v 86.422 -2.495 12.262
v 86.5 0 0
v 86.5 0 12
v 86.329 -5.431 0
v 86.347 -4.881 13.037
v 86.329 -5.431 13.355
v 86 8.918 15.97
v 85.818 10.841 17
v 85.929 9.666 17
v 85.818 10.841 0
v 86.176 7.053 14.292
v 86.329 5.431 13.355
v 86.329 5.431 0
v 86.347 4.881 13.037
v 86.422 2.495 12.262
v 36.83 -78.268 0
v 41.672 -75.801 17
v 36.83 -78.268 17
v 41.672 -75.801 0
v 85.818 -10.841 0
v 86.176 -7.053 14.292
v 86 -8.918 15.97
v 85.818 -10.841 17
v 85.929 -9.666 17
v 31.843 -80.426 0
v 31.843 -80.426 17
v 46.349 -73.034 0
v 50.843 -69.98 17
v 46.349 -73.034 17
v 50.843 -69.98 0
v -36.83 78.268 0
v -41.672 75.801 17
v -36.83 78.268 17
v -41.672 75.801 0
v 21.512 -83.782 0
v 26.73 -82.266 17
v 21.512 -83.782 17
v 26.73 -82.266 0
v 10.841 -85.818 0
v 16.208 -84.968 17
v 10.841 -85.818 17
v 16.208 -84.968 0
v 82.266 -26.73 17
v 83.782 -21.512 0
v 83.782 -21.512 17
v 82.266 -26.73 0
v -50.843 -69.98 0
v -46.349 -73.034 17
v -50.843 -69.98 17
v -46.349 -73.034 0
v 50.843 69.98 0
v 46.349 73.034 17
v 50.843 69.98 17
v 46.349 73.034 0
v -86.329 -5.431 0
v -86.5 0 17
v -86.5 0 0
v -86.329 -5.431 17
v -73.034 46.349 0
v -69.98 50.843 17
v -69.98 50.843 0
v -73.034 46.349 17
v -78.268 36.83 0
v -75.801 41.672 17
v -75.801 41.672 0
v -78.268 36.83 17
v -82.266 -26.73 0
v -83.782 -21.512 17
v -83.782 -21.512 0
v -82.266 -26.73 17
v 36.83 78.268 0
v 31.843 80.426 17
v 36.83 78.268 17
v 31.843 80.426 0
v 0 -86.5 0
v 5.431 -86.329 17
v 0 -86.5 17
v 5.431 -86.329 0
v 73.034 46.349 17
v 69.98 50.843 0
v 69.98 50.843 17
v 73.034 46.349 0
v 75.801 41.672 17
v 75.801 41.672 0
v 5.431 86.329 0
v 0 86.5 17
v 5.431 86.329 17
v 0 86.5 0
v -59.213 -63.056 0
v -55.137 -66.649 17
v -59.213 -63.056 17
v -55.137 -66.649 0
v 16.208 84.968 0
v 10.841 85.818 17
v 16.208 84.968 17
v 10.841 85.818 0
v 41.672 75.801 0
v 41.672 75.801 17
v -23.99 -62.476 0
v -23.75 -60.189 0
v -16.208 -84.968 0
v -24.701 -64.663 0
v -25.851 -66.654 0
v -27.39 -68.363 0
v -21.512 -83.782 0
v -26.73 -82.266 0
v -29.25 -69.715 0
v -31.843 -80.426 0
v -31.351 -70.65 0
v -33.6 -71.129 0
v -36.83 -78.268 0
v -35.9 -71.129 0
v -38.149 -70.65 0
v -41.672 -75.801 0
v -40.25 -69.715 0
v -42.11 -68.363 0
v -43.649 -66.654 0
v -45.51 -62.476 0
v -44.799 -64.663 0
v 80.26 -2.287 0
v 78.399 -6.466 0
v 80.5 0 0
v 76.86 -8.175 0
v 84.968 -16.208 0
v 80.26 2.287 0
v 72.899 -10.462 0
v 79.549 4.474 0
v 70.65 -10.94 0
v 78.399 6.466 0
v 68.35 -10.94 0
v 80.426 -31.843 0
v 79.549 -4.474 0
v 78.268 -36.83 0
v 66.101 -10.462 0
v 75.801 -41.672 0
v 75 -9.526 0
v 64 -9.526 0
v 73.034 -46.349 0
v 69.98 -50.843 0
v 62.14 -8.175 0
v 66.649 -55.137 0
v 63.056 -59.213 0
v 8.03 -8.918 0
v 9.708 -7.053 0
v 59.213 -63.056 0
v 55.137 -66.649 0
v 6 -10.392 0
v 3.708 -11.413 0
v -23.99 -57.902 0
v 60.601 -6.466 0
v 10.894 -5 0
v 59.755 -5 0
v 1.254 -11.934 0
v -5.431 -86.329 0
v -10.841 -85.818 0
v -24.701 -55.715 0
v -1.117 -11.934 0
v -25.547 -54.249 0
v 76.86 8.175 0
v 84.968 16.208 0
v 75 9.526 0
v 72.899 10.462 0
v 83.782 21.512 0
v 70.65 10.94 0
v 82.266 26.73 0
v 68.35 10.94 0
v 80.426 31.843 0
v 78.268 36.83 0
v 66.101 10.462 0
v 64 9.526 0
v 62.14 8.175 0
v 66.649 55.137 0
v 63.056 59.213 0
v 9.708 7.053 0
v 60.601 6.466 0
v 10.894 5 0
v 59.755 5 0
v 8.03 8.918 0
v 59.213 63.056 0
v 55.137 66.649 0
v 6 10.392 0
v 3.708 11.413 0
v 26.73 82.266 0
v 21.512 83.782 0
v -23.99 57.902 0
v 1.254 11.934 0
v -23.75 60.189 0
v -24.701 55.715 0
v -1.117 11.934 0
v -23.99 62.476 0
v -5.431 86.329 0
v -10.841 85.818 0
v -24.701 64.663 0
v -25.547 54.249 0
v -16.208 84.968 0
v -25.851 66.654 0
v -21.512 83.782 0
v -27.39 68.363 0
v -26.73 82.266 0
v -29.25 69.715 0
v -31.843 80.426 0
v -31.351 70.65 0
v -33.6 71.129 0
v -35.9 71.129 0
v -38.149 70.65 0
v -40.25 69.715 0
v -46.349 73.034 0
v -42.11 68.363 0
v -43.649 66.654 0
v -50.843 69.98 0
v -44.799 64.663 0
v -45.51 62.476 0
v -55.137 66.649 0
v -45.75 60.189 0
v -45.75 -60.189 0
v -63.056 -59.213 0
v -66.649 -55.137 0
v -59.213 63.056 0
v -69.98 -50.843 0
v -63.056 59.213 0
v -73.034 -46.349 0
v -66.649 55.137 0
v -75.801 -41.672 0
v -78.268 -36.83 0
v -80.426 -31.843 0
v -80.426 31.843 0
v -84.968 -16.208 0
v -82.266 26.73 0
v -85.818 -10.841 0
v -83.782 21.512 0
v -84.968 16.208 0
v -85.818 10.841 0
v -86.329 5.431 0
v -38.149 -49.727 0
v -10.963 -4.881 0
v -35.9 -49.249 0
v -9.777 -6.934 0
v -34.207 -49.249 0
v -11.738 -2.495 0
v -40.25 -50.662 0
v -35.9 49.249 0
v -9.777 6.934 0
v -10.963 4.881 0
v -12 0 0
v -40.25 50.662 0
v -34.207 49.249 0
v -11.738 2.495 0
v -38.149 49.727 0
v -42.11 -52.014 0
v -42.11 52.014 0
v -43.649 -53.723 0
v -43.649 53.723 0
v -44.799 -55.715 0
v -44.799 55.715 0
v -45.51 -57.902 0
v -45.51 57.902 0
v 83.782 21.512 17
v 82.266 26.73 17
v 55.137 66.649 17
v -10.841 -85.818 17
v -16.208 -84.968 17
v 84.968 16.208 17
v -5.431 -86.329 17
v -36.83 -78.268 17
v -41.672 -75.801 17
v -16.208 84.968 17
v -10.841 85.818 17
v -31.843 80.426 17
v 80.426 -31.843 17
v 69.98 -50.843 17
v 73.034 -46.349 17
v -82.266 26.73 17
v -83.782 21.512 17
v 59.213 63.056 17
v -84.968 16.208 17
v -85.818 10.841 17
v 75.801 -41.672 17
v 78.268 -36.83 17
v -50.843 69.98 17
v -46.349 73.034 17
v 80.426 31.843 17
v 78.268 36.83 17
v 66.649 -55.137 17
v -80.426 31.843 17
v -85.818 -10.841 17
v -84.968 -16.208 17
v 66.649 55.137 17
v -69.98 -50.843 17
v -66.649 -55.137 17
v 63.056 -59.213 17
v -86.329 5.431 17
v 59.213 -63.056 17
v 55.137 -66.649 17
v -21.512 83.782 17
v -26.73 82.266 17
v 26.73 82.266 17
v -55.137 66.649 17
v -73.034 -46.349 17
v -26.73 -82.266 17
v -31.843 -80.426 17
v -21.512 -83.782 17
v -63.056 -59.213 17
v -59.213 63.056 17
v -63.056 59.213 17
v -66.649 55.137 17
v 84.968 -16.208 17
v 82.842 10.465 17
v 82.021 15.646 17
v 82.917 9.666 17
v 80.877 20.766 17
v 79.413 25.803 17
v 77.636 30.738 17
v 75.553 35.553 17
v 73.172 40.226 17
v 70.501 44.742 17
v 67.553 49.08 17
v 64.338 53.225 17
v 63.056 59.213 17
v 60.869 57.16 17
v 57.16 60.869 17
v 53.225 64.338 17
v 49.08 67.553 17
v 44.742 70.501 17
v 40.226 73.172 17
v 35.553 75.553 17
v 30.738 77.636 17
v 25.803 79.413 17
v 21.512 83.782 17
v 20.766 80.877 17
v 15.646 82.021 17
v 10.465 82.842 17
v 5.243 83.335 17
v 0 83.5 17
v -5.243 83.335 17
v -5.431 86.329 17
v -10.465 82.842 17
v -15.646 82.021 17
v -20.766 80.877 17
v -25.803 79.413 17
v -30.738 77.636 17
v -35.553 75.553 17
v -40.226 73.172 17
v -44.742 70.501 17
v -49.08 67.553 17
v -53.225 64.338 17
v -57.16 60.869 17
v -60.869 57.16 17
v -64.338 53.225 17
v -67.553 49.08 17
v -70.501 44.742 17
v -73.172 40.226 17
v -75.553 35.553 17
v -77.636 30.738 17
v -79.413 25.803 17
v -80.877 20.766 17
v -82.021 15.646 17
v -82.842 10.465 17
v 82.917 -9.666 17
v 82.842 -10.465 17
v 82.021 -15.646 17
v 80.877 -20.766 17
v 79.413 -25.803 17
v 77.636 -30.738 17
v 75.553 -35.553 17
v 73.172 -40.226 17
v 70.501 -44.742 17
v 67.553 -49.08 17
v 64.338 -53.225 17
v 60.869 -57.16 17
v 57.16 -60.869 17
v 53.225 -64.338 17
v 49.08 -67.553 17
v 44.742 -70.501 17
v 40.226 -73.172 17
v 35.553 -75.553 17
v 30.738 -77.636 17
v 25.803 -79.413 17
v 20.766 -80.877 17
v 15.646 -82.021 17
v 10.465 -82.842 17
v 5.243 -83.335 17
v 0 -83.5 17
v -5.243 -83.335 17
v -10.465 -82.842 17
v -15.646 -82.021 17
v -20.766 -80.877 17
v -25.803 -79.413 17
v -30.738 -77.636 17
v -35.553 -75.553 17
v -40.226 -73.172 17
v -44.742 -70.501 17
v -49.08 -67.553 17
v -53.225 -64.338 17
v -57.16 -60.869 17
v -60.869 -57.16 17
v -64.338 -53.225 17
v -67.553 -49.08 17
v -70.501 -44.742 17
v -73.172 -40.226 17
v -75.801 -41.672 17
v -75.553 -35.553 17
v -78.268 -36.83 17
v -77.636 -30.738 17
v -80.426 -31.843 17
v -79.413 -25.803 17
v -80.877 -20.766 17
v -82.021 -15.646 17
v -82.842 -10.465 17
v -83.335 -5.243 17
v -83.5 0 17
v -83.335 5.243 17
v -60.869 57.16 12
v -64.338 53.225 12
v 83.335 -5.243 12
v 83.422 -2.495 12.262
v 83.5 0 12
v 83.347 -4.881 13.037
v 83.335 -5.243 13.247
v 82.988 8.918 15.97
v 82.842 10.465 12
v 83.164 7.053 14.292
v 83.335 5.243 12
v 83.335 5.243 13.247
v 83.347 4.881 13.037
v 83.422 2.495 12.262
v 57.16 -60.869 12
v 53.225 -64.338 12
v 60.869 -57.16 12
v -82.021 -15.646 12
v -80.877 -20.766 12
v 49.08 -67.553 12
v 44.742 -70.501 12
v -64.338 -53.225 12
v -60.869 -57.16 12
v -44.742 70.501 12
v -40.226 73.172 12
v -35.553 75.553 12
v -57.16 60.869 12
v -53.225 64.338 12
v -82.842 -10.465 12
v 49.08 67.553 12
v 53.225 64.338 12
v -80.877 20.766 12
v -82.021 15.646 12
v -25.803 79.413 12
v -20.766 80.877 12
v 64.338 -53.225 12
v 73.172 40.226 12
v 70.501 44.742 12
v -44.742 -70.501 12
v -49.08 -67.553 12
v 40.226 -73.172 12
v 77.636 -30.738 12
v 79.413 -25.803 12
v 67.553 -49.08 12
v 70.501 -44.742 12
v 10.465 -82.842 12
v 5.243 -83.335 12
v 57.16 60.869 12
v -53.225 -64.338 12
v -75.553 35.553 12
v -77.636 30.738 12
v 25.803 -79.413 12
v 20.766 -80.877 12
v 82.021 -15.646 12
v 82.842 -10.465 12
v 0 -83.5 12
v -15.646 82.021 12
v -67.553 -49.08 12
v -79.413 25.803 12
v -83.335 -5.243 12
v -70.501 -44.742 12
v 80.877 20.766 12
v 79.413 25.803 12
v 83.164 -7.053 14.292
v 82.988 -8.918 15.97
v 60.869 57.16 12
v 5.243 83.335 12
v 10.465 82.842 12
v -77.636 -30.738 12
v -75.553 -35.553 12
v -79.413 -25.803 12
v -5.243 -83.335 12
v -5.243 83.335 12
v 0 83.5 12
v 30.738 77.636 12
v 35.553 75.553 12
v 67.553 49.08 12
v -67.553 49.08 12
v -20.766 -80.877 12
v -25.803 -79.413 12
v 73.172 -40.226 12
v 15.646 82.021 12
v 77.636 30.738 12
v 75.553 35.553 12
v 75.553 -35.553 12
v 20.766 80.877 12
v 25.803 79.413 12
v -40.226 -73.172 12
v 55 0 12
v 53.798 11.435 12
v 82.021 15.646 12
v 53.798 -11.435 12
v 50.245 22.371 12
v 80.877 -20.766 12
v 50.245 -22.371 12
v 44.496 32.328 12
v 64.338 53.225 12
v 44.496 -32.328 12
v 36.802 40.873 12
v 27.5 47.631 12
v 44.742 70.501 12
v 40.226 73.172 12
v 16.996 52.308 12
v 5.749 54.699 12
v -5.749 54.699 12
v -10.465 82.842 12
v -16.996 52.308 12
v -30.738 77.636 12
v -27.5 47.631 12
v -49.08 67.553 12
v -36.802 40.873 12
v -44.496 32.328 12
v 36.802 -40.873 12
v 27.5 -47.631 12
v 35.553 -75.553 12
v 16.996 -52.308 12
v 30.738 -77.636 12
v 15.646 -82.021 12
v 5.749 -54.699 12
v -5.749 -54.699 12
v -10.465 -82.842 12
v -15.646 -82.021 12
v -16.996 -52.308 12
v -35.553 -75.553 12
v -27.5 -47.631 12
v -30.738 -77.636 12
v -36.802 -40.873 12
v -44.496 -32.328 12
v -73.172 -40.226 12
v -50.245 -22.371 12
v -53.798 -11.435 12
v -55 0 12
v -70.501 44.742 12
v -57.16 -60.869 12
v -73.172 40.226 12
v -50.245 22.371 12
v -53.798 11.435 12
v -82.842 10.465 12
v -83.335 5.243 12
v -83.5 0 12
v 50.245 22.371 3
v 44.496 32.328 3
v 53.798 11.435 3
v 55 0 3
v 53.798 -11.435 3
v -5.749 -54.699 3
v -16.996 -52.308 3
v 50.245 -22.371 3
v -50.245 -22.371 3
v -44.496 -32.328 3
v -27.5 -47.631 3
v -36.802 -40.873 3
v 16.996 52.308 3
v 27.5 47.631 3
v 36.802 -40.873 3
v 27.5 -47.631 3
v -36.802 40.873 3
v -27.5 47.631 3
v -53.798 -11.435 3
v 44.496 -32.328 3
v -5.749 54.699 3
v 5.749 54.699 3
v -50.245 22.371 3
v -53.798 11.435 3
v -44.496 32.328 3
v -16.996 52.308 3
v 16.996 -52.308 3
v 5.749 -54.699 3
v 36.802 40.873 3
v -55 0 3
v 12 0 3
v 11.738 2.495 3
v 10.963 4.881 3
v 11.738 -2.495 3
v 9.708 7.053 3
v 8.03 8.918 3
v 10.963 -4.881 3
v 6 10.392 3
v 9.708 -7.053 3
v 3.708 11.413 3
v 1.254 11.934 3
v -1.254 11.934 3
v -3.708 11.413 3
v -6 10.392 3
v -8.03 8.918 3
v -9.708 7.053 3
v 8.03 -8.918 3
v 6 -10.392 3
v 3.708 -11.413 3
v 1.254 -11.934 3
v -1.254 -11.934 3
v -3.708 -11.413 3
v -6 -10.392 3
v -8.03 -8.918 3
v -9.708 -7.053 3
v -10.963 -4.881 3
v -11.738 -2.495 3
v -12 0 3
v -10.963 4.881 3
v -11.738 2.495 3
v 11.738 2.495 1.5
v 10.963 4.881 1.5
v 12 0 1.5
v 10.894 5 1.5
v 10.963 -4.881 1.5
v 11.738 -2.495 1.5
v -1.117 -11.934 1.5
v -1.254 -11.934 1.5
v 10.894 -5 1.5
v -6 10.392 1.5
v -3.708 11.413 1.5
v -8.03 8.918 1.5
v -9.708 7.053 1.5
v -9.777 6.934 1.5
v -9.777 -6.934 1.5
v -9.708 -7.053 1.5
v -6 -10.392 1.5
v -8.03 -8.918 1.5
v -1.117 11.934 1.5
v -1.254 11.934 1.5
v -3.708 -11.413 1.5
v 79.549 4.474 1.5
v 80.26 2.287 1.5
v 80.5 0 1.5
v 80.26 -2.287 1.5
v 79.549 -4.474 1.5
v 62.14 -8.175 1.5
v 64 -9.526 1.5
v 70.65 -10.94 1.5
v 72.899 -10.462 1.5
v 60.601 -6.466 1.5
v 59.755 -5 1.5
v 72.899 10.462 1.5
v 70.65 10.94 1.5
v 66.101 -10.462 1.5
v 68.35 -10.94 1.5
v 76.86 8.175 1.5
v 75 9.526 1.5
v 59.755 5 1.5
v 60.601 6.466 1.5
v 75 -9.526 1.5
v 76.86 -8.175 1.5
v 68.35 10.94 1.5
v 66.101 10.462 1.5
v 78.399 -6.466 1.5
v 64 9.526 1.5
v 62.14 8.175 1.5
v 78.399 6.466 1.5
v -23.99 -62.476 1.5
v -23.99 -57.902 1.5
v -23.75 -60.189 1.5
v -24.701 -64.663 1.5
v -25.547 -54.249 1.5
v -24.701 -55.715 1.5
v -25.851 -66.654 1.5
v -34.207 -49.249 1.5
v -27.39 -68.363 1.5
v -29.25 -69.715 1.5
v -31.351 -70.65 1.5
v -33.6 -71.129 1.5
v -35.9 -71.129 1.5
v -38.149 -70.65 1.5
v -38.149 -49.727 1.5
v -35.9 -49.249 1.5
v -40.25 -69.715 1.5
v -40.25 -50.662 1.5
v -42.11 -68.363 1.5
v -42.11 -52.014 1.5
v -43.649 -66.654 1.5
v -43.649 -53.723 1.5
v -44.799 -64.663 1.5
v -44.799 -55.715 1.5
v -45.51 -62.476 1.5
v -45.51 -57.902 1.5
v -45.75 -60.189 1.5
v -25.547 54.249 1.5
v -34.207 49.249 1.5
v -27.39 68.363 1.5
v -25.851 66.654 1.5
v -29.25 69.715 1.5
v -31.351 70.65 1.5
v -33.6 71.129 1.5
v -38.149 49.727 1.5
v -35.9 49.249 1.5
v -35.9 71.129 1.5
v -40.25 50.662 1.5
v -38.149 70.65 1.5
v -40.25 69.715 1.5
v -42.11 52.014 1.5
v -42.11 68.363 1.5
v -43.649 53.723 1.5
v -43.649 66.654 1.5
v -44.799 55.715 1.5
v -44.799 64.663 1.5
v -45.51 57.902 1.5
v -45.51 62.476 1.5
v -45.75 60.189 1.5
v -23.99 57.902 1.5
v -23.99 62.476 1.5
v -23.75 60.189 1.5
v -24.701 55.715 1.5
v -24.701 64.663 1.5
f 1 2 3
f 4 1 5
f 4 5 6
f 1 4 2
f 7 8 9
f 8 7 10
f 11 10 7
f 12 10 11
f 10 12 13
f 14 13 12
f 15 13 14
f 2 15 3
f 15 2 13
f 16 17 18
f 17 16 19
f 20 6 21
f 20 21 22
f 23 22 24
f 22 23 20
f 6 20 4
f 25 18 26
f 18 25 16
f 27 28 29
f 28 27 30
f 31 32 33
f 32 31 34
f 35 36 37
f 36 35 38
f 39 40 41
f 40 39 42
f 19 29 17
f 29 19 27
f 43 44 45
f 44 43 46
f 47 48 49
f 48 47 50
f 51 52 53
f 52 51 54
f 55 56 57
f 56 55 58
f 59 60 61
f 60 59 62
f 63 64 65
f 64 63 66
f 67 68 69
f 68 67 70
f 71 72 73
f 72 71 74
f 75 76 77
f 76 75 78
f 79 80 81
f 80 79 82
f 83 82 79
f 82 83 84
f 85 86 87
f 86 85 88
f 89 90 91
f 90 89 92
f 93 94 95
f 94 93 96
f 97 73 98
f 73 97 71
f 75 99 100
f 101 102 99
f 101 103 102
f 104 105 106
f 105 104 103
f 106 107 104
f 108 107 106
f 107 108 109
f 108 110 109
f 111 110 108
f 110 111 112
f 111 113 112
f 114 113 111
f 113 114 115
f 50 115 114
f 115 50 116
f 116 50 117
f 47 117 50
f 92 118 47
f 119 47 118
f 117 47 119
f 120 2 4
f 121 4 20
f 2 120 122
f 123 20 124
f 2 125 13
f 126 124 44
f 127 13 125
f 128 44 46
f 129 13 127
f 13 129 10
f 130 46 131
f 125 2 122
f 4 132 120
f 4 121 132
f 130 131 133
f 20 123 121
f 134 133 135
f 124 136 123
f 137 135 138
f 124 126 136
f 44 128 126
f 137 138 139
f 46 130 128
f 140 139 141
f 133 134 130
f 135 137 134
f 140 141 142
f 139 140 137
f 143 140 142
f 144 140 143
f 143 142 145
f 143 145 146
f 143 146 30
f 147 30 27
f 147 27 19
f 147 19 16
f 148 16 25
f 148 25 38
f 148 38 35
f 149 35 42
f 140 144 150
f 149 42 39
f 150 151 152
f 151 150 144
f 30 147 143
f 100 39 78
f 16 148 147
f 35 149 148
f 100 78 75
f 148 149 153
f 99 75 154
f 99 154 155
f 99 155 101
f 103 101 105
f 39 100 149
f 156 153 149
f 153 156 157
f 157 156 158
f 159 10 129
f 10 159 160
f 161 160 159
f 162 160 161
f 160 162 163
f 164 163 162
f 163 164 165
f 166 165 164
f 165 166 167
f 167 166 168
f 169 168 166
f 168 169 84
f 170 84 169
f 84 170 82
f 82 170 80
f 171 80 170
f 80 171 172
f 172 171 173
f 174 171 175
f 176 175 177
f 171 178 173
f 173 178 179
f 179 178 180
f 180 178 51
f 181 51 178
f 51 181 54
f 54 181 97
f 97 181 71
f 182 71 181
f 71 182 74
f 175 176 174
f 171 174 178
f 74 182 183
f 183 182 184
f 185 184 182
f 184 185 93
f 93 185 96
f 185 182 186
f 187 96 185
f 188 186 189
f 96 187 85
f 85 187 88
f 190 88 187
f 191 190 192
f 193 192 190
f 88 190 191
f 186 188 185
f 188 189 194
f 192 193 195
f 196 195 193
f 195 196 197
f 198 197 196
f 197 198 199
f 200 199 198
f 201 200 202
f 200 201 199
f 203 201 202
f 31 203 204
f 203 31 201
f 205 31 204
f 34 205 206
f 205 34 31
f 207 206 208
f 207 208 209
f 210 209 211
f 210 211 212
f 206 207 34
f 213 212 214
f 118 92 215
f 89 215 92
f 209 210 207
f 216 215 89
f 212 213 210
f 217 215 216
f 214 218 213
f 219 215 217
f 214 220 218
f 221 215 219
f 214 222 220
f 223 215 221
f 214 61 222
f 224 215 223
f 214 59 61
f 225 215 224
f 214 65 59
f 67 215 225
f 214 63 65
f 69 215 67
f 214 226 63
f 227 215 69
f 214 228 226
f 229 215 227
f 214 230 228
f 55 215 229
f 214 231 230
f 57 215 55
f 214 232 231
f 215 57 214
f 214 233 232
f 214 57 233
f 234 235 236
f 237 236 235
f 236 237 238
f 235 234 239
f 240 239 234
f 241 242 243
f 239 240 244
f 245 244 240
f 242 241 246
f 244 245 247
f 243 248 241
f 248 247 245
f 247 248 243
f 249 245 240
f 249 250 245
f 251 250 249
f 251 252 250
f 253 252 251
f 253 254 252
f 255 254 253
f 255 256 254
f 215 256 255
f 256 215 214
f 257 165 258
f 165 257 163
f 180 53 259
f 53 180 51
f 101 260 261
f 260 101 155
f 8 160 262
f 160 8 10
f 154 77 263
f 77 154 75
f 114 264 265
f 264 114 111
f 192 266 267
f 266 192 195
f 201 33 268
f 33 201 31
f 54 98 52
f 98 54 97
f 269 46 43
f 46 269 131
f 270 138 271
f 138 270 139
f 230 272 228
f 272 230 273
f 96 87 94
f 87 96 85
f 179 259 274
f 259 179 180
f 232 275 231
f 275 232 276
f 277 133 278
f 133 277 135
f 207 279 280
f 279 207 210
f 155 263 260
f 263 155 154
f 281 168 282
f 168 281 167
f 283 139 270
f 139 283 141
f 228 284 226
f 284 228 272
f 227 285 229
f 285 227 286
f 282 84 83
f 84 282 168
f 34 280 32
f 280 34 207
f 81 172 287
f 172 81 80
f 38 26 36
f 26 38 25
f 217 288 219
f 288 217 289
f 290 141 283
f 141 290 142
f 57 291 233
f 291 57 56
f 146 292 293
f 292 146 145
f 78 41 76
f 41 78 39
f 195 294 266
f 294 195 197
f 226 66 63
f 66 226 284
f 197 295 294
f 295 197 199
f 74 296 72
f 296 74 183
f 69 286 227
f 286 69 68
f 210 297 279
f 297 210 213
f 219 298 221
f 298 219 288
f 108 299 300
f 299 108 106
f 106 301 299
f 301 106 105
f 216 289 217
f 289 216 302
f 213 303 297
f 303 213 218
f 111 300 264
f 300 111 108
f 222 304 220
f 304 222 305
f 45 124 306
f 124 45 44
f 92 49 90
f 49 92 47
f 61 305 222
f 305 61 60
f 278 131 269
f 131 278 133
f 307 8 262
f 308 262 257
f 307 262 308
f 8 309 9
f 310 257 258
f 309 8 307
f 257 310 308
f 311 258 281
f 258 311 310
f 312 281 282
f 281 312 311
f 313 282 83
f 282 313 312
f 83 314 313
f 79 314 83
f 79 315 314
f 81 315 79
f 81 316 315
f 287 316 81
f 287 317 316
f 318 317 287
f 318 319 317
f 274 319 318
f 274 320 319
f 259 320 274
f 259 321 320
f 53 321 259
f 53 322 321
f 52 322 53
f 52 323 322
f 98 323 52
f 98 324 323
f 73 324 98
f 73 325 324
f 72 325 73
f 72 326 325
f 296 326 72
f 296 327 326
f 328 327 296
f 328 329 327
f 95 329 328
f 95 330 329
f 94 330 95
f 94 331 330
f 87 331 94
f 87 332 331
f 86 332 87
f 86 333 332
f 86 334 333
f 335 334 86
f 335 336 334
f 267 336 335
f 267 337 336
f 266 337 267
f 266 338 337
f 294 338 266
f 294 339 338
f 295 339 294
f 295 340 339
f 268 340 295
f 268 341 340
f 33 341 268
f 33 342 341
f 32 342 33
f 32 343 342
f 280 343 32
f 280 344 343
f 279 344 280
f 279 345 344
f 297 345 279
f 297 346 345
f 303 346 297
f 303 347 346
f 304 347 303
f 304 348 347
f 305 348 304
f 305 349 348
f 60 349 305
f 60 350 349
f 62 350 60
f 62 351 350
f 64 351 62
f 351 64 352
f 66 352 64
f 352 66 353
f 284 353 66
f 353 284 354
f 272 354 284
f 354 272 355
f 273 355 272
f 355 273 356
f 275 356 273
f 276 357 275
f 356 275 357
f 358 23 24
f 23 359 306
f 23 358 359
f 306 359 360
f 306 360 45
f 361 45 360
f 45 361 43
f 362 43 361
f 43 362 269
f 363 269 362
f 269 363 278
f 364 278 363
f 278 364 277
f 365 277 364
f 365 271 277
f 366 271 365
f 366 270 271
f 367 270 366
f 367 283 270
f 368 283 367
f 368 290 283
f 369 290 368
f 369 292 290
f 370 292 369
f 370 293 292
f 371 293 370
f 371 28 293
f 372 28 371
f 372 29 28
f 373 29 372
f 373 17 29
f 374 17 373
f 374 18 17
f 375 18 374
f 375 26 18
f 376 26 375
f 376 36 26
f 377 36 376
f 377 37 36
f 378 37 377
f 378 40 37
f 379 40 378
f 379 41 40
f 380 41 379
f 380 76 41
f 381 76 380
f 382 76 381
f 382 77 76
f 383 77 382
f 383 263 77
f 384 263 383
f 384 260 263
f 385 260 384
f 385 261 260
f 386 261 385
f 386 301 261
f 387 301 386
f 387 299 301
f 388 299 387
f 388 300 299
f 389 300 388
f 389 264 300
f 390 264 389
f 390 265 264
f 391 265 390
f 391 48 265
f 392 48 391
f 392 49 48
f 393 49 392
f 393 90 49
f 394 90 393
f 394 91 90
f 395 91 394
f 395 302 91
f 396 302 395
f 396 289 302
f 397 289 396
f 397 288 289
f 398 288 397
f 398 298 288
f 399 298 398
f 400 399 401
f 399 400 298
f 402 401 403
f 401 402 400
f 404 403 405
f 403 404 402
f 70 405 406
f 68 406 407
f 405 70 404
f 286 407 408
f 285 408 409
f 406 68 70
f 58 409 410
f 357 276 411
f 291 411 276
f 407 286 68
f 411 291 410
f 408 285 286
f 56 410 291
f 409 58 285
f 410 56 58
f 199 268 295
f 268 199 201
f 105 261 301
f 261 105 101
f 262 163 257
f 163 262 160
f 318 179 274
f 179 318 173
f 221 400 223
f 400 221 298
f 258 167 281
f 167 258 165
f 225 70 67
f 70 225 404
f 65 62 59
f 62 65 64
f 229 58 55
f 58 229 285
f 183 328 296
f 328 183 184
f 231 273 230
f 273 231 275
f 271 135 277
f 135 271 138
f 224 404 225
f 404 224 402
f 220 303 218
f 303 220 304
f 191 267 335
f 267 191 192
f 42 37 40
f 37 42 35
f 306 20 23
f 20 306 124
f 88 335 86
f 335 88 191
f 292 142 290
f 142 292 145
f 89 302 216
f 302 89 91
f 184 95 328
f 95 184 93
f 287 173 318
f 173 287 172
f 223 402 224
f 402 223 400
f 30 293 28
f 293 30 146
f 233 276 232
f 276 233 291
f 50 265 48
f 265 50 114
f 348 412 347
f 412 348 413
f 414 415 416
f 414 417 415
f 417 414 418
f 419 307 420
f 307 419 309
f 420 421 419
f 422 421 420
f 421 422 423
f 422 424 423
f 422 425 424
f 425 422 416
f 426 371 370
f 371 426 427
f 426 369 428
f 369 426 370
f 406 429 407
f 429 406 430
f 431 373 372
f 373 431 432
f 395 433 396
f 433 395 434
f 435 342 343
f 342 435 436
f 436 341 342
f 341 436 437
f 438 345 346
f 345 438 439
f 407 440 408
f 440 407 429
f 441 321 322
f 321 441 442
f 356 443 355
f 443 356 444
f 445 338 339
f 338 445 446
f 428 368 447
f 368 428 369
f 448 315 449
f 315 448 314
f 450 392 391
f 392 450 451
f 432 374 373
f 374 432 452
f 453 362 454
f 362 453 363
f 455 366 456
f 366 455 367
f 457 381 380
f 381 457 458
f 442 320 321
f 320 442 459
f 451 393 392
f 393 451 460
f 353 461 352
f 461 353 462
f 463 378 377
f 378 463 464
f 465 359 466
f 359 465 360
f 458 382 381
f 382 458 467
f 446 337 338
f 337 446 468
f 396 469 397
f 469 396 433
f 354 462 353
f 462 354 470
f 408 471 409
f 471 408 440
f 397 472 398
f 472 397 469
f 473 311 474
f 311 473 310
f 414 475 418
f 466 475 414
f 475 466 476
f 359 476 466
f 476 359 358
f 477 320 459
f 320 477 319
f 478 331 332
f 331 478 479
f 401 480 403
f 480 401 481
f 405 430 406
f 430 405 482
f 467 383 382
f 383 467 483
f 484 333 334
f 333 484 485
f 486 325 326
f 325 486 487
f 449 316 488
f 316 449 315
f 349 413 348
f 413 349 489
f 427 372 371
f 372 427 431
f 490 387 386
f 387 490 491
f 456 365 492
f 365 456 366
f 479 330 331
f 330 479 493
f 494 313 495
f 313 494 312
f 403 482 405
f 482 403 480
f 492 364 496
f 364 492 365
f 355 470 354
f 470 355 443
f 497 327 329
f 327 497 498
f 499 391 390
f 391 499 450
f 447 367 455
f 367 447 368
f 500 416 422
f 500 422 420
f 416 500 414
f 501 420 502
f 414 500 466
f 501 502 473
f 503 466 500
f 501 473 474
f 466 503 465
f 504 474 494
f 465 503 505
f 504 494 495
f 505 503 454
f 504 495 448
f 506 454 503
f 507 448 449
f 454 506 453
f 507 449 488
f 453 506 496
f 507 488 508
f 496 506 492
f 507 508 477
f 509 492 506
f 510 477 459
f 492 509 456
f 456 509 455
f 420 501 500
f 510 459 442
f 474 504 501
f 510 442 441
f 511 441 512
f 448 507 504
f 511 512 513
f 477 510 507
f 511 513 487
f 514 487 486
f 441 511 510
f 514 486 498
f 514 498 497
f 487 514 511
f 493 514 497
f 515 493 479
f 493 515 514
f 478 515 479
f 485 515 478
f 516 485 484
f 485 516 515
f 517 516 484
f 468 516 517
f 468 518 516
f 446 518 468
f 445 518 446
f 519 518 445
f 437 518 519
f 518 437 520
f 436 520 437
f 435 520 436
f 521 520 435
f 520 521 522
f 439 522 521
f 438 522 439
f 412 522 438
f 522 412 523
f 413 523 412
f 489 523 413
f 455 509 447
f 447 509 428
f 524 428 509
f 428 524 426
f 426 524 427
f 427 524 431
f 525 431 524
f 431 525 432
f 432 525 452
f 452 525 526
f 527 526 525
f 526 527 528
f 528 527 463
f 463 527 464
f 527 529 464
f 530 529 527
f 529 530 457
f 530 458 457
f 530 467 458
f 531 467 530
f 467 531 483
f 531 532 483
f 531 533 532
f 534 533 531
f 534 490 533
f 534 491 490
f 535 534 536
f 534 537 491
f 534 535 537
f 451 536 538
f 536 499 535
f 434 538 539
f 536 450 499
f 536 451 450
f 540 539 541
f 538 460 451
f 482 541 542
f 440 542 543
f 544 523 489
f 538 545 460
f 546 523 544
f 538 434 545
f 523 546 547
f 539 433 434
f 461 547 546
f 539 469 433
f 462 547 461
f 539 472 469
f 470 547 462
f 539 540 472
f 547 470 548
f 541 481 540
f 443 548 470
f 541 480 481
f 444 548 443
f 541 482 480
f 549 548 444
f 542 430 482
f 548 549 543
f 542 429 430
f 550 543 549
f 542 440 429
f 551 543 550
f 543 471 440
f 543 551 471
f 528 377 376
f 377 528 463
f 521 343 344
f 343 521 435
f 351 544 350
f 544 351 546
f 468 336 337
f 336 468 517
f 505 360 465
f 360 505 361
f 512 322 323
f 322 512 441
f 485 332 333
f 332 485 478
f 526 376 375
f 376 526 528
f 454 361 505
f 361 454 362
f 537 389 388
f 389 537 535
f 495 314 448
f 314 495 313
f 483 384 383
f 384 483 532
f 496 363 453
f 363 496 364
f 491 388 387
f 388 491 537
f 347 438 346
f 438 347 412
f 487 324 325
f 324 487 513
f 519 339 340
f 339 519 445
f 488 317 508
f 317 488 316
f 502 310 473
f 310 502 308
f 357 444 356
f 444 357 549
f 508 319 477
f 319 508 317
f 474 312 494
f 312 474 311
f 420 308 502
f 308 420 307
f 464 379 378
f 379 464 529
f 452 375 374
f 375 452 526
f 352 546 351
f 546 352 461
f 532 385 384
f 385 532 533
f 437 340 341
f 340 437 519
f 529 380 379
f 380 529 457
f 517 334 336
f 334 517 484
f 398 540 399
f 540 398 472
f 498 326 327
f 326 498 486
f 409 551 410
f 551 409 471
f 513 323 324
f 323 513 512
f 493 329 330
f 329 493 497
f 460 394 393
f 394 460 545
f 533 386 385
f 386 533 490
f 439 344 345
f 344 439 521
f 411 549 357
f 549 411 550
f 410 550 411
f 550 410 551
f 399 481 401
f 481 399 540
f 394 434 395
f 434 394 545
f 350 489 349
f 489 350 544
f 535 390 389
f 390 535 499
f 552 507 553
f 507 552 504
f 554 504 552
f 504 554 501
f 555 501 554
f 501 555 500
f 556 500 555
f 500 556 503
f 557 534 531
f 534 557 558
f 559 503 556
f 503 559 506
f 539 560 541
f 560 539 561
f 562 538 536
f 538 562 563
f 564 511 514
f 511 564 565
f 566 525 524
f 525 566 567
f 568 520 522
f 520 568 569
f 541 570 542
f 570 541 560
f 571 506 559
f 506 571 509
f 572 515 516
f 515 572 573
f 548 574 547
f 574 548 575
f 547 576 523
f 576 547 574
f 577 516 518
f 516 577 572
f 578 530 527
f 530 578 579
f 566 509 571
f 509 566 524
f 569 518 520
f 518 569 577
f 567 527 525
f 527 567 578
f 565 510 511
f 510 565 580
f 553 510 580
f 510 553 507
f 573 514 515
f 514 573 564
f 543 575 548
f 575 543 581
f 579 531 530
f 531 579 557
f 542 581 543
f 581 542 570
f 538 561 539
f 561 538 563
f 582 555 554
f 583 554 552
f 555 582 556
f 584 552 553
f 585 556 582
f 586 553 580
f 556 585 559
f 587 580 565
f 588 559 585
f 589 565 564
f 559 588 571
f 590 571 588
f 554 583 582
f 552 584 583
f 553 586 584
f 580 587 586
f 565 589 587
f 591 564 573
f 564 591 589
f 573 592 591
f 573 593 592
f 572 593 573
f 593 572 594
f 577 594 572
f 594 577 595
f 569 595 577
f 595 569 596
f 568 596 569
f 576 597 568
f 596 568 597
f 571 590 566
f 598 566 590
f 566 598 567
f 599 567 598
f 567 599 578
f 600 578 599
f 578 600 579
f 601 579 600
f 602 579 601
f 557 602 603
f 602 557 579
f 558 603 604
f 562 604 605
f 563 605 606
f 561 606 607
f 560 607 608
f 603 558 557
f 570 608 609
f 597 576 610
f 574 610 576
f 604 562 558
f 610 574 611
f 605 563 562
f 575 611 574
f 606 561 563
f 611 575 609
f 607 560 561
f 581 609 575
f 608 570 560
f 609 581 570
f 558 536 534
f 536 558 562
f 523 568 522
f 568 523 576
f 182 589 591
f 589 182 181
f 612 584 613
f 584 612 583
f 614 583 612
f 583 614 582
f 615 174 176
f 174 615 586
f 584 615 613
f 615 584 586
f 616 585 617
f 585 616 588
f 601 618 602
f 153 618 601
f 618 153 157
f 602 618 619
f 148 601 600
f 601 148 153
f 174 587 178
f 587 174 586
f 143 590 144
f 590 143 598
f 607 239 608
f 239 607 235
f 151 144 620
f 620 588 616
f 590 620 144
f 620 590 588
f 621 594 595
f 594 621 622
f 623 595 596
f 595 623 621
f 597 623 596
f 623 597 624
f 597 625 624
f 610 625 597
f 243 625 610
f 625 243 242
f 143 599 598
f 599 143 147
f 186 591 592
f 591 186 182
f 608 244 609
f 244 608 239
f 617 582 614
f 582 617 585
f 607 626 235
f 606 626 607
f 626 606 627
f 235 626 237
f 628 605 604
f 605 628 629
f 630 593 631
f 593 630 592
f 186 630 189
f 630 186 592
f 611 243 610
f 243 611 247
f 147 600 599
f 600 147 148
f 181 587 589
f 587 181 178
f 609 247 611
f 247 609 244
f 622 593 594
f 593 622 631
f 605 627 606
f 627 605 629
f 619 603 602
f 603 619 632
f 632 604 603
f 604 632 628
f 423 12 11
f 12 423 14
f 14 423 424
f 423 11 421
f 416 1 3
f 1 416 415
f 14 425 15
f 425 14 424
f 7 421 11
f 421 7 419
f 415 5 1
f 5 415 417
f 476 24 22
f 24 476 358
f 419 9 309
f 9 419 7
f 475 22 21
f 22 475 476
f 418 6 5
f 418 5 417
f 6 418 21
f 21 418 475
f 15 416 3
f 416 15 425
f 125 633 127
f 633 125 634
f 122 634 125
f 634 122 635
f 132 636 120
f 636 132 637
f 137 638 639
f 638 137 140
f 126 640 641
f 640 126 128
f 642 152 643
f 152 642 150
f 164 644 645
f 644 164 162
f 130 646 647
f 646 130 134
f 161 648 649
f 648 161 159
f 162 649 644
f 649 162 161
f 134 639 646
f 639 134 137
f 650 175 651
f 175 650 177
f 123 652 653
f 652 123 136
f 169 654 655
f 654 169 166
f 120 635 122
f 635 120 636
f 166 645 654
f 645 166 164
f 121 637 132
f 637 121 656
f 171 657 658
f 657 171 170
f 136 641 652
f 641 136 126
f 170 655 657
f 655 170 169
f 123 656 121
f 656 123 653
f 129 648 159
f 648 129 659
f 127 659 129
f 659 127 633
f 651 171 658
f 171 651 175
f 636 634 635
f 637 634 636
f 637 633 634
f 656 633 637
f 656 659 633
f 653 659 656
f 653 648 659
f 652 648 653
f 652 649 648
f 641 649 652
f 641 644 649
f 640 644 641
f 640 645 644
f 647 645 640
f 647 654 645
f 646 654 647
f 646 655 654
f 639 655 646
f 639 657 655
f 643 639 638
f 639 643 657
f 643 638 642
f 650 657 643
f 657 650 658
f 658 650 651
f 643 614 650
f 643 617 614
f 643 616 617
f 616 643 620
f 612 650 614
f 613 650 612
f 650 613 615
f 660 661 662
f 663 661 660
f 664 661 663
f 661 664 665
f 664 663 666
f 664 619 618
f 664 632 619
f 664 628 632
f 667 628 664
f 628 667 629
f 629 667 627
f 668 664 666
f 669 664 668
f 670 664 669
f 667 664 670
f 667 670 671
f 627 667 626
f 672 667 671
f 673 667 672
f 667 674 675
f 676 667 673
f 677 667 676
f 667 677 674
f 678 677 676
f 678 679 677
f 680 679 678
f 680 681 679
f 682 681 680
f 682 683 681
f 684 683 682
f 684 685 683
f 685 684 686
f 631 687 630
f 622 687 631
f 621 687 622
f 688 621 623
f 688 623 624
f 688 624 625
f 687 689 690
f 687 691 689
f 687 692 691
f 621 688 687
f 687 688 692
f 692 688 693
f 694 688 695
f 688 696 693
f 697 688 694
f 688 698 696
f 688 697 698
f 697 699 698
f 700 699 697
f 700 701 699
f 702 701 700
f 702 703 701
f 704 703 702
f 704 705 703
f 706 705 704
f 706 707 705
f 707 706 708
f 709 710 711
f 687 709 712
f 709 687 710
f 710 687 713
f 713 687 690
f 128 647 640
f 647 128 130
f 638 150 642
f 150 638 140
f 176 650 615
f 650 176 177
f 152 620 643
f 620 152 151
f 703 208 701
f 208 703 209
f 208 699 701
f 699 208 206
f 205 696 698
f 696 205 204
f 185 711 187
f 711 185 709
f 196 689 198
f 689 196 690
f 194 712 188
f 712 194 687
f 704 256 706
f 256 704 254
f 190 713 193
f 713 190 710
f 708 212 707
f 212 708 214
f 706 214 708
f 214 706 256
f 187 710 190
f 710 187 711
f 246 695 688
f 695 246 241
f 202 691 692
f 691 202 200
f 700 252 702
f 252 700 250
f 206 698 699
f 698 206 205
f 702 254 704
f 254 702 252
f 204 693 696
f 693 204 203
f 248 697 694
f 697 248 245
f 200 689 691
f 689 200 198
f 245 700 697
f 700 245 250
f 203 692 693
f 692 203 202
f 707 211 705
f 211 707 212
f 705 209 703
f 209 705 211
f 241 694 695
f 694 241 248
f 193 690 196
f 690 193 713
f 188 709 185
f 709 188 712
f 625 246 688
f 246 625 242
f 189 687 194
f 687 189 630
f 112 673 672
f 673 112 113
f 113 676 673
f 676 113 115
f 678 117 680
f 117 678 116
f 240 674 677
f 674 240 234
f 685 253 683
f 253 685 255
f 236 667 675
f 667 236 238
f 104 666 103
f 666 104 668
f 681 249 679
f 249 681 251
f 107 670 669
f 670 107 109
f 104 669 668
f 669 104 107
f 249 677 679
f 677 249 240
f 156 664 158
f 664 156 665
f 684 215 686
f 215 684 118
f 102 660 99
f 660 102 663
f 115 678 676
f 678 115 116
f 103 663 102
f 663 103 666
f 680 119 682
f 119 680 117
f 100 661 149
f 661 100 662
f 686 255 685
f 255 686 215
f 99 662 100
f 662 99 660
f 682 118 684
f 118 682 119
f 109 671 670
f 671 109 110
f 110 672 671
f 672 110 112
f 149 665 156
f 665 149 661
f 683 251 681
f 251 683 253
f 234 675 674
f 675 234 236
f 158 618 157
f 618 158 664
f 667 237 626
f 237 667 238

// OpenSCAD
//Diameter of the connection station of the Kettle (mm)
station_diameter = 167;

// With of cable protuding from connection station (mm)
cable_width=12;

/* [advaced configurations] */
//wall and floor thickness
wall=3;

r1=station_diameter/2+wall;
r2=r1-wall;
r3=110/2;

//total height
h1=17;
//height of sensor pocket
h2= 12;

/*cable trap params*/
//number of cable traps
cn=1;
cr=cable_width;

//FSR dimensions
//radius of FSR sensor area
FSRr=11;
r4=FSRr+1;
// width of FSR sensor connector section
FSRw=10;


module main(){
	difference(){
		cylinder(r = r1, h = h1, $fn=100);
		translate([0,0,h2]) cylinder(r = r2, h = h1-h2, $fn=100);
		translate([0,0,wall]) cylinder(r = r3, h = h1-wall);
		cylinder(r = r4, h=wall);
	}
}

module traps(){
	ch = h1-h2-cr;
	for( a = [0:360/cn:360]) {
       rotate([0,0,a]) translate([r1,0,0]) rotate([0,-90,0])
			hull(){
				cylinder(r=cr,h=wall*2);
				translate([cr/2,-cr,0]) cube([ch,cr*2,wall*2]);
			}
	}
}

module kettleBase(){
	difference(){
		main();
		translate([0,0,h2+cr]) traps();
		for( a = [0:360/3:360]) {
       rotate([0,0,a]) translate([r1-FSRr-wall*2,0,0])
			FSRtrap(r1-FSRr*2-wall*2,wall/2);
	}
	}
}

module FSRtrap(l,h){
	union(){
		cylinder(r=FSRr,h=h);
		translate([-l-FSRr,-FSRw/2,0]) cube([l+FSRr,FSRw,h]);
	}
}
kettleBase();
